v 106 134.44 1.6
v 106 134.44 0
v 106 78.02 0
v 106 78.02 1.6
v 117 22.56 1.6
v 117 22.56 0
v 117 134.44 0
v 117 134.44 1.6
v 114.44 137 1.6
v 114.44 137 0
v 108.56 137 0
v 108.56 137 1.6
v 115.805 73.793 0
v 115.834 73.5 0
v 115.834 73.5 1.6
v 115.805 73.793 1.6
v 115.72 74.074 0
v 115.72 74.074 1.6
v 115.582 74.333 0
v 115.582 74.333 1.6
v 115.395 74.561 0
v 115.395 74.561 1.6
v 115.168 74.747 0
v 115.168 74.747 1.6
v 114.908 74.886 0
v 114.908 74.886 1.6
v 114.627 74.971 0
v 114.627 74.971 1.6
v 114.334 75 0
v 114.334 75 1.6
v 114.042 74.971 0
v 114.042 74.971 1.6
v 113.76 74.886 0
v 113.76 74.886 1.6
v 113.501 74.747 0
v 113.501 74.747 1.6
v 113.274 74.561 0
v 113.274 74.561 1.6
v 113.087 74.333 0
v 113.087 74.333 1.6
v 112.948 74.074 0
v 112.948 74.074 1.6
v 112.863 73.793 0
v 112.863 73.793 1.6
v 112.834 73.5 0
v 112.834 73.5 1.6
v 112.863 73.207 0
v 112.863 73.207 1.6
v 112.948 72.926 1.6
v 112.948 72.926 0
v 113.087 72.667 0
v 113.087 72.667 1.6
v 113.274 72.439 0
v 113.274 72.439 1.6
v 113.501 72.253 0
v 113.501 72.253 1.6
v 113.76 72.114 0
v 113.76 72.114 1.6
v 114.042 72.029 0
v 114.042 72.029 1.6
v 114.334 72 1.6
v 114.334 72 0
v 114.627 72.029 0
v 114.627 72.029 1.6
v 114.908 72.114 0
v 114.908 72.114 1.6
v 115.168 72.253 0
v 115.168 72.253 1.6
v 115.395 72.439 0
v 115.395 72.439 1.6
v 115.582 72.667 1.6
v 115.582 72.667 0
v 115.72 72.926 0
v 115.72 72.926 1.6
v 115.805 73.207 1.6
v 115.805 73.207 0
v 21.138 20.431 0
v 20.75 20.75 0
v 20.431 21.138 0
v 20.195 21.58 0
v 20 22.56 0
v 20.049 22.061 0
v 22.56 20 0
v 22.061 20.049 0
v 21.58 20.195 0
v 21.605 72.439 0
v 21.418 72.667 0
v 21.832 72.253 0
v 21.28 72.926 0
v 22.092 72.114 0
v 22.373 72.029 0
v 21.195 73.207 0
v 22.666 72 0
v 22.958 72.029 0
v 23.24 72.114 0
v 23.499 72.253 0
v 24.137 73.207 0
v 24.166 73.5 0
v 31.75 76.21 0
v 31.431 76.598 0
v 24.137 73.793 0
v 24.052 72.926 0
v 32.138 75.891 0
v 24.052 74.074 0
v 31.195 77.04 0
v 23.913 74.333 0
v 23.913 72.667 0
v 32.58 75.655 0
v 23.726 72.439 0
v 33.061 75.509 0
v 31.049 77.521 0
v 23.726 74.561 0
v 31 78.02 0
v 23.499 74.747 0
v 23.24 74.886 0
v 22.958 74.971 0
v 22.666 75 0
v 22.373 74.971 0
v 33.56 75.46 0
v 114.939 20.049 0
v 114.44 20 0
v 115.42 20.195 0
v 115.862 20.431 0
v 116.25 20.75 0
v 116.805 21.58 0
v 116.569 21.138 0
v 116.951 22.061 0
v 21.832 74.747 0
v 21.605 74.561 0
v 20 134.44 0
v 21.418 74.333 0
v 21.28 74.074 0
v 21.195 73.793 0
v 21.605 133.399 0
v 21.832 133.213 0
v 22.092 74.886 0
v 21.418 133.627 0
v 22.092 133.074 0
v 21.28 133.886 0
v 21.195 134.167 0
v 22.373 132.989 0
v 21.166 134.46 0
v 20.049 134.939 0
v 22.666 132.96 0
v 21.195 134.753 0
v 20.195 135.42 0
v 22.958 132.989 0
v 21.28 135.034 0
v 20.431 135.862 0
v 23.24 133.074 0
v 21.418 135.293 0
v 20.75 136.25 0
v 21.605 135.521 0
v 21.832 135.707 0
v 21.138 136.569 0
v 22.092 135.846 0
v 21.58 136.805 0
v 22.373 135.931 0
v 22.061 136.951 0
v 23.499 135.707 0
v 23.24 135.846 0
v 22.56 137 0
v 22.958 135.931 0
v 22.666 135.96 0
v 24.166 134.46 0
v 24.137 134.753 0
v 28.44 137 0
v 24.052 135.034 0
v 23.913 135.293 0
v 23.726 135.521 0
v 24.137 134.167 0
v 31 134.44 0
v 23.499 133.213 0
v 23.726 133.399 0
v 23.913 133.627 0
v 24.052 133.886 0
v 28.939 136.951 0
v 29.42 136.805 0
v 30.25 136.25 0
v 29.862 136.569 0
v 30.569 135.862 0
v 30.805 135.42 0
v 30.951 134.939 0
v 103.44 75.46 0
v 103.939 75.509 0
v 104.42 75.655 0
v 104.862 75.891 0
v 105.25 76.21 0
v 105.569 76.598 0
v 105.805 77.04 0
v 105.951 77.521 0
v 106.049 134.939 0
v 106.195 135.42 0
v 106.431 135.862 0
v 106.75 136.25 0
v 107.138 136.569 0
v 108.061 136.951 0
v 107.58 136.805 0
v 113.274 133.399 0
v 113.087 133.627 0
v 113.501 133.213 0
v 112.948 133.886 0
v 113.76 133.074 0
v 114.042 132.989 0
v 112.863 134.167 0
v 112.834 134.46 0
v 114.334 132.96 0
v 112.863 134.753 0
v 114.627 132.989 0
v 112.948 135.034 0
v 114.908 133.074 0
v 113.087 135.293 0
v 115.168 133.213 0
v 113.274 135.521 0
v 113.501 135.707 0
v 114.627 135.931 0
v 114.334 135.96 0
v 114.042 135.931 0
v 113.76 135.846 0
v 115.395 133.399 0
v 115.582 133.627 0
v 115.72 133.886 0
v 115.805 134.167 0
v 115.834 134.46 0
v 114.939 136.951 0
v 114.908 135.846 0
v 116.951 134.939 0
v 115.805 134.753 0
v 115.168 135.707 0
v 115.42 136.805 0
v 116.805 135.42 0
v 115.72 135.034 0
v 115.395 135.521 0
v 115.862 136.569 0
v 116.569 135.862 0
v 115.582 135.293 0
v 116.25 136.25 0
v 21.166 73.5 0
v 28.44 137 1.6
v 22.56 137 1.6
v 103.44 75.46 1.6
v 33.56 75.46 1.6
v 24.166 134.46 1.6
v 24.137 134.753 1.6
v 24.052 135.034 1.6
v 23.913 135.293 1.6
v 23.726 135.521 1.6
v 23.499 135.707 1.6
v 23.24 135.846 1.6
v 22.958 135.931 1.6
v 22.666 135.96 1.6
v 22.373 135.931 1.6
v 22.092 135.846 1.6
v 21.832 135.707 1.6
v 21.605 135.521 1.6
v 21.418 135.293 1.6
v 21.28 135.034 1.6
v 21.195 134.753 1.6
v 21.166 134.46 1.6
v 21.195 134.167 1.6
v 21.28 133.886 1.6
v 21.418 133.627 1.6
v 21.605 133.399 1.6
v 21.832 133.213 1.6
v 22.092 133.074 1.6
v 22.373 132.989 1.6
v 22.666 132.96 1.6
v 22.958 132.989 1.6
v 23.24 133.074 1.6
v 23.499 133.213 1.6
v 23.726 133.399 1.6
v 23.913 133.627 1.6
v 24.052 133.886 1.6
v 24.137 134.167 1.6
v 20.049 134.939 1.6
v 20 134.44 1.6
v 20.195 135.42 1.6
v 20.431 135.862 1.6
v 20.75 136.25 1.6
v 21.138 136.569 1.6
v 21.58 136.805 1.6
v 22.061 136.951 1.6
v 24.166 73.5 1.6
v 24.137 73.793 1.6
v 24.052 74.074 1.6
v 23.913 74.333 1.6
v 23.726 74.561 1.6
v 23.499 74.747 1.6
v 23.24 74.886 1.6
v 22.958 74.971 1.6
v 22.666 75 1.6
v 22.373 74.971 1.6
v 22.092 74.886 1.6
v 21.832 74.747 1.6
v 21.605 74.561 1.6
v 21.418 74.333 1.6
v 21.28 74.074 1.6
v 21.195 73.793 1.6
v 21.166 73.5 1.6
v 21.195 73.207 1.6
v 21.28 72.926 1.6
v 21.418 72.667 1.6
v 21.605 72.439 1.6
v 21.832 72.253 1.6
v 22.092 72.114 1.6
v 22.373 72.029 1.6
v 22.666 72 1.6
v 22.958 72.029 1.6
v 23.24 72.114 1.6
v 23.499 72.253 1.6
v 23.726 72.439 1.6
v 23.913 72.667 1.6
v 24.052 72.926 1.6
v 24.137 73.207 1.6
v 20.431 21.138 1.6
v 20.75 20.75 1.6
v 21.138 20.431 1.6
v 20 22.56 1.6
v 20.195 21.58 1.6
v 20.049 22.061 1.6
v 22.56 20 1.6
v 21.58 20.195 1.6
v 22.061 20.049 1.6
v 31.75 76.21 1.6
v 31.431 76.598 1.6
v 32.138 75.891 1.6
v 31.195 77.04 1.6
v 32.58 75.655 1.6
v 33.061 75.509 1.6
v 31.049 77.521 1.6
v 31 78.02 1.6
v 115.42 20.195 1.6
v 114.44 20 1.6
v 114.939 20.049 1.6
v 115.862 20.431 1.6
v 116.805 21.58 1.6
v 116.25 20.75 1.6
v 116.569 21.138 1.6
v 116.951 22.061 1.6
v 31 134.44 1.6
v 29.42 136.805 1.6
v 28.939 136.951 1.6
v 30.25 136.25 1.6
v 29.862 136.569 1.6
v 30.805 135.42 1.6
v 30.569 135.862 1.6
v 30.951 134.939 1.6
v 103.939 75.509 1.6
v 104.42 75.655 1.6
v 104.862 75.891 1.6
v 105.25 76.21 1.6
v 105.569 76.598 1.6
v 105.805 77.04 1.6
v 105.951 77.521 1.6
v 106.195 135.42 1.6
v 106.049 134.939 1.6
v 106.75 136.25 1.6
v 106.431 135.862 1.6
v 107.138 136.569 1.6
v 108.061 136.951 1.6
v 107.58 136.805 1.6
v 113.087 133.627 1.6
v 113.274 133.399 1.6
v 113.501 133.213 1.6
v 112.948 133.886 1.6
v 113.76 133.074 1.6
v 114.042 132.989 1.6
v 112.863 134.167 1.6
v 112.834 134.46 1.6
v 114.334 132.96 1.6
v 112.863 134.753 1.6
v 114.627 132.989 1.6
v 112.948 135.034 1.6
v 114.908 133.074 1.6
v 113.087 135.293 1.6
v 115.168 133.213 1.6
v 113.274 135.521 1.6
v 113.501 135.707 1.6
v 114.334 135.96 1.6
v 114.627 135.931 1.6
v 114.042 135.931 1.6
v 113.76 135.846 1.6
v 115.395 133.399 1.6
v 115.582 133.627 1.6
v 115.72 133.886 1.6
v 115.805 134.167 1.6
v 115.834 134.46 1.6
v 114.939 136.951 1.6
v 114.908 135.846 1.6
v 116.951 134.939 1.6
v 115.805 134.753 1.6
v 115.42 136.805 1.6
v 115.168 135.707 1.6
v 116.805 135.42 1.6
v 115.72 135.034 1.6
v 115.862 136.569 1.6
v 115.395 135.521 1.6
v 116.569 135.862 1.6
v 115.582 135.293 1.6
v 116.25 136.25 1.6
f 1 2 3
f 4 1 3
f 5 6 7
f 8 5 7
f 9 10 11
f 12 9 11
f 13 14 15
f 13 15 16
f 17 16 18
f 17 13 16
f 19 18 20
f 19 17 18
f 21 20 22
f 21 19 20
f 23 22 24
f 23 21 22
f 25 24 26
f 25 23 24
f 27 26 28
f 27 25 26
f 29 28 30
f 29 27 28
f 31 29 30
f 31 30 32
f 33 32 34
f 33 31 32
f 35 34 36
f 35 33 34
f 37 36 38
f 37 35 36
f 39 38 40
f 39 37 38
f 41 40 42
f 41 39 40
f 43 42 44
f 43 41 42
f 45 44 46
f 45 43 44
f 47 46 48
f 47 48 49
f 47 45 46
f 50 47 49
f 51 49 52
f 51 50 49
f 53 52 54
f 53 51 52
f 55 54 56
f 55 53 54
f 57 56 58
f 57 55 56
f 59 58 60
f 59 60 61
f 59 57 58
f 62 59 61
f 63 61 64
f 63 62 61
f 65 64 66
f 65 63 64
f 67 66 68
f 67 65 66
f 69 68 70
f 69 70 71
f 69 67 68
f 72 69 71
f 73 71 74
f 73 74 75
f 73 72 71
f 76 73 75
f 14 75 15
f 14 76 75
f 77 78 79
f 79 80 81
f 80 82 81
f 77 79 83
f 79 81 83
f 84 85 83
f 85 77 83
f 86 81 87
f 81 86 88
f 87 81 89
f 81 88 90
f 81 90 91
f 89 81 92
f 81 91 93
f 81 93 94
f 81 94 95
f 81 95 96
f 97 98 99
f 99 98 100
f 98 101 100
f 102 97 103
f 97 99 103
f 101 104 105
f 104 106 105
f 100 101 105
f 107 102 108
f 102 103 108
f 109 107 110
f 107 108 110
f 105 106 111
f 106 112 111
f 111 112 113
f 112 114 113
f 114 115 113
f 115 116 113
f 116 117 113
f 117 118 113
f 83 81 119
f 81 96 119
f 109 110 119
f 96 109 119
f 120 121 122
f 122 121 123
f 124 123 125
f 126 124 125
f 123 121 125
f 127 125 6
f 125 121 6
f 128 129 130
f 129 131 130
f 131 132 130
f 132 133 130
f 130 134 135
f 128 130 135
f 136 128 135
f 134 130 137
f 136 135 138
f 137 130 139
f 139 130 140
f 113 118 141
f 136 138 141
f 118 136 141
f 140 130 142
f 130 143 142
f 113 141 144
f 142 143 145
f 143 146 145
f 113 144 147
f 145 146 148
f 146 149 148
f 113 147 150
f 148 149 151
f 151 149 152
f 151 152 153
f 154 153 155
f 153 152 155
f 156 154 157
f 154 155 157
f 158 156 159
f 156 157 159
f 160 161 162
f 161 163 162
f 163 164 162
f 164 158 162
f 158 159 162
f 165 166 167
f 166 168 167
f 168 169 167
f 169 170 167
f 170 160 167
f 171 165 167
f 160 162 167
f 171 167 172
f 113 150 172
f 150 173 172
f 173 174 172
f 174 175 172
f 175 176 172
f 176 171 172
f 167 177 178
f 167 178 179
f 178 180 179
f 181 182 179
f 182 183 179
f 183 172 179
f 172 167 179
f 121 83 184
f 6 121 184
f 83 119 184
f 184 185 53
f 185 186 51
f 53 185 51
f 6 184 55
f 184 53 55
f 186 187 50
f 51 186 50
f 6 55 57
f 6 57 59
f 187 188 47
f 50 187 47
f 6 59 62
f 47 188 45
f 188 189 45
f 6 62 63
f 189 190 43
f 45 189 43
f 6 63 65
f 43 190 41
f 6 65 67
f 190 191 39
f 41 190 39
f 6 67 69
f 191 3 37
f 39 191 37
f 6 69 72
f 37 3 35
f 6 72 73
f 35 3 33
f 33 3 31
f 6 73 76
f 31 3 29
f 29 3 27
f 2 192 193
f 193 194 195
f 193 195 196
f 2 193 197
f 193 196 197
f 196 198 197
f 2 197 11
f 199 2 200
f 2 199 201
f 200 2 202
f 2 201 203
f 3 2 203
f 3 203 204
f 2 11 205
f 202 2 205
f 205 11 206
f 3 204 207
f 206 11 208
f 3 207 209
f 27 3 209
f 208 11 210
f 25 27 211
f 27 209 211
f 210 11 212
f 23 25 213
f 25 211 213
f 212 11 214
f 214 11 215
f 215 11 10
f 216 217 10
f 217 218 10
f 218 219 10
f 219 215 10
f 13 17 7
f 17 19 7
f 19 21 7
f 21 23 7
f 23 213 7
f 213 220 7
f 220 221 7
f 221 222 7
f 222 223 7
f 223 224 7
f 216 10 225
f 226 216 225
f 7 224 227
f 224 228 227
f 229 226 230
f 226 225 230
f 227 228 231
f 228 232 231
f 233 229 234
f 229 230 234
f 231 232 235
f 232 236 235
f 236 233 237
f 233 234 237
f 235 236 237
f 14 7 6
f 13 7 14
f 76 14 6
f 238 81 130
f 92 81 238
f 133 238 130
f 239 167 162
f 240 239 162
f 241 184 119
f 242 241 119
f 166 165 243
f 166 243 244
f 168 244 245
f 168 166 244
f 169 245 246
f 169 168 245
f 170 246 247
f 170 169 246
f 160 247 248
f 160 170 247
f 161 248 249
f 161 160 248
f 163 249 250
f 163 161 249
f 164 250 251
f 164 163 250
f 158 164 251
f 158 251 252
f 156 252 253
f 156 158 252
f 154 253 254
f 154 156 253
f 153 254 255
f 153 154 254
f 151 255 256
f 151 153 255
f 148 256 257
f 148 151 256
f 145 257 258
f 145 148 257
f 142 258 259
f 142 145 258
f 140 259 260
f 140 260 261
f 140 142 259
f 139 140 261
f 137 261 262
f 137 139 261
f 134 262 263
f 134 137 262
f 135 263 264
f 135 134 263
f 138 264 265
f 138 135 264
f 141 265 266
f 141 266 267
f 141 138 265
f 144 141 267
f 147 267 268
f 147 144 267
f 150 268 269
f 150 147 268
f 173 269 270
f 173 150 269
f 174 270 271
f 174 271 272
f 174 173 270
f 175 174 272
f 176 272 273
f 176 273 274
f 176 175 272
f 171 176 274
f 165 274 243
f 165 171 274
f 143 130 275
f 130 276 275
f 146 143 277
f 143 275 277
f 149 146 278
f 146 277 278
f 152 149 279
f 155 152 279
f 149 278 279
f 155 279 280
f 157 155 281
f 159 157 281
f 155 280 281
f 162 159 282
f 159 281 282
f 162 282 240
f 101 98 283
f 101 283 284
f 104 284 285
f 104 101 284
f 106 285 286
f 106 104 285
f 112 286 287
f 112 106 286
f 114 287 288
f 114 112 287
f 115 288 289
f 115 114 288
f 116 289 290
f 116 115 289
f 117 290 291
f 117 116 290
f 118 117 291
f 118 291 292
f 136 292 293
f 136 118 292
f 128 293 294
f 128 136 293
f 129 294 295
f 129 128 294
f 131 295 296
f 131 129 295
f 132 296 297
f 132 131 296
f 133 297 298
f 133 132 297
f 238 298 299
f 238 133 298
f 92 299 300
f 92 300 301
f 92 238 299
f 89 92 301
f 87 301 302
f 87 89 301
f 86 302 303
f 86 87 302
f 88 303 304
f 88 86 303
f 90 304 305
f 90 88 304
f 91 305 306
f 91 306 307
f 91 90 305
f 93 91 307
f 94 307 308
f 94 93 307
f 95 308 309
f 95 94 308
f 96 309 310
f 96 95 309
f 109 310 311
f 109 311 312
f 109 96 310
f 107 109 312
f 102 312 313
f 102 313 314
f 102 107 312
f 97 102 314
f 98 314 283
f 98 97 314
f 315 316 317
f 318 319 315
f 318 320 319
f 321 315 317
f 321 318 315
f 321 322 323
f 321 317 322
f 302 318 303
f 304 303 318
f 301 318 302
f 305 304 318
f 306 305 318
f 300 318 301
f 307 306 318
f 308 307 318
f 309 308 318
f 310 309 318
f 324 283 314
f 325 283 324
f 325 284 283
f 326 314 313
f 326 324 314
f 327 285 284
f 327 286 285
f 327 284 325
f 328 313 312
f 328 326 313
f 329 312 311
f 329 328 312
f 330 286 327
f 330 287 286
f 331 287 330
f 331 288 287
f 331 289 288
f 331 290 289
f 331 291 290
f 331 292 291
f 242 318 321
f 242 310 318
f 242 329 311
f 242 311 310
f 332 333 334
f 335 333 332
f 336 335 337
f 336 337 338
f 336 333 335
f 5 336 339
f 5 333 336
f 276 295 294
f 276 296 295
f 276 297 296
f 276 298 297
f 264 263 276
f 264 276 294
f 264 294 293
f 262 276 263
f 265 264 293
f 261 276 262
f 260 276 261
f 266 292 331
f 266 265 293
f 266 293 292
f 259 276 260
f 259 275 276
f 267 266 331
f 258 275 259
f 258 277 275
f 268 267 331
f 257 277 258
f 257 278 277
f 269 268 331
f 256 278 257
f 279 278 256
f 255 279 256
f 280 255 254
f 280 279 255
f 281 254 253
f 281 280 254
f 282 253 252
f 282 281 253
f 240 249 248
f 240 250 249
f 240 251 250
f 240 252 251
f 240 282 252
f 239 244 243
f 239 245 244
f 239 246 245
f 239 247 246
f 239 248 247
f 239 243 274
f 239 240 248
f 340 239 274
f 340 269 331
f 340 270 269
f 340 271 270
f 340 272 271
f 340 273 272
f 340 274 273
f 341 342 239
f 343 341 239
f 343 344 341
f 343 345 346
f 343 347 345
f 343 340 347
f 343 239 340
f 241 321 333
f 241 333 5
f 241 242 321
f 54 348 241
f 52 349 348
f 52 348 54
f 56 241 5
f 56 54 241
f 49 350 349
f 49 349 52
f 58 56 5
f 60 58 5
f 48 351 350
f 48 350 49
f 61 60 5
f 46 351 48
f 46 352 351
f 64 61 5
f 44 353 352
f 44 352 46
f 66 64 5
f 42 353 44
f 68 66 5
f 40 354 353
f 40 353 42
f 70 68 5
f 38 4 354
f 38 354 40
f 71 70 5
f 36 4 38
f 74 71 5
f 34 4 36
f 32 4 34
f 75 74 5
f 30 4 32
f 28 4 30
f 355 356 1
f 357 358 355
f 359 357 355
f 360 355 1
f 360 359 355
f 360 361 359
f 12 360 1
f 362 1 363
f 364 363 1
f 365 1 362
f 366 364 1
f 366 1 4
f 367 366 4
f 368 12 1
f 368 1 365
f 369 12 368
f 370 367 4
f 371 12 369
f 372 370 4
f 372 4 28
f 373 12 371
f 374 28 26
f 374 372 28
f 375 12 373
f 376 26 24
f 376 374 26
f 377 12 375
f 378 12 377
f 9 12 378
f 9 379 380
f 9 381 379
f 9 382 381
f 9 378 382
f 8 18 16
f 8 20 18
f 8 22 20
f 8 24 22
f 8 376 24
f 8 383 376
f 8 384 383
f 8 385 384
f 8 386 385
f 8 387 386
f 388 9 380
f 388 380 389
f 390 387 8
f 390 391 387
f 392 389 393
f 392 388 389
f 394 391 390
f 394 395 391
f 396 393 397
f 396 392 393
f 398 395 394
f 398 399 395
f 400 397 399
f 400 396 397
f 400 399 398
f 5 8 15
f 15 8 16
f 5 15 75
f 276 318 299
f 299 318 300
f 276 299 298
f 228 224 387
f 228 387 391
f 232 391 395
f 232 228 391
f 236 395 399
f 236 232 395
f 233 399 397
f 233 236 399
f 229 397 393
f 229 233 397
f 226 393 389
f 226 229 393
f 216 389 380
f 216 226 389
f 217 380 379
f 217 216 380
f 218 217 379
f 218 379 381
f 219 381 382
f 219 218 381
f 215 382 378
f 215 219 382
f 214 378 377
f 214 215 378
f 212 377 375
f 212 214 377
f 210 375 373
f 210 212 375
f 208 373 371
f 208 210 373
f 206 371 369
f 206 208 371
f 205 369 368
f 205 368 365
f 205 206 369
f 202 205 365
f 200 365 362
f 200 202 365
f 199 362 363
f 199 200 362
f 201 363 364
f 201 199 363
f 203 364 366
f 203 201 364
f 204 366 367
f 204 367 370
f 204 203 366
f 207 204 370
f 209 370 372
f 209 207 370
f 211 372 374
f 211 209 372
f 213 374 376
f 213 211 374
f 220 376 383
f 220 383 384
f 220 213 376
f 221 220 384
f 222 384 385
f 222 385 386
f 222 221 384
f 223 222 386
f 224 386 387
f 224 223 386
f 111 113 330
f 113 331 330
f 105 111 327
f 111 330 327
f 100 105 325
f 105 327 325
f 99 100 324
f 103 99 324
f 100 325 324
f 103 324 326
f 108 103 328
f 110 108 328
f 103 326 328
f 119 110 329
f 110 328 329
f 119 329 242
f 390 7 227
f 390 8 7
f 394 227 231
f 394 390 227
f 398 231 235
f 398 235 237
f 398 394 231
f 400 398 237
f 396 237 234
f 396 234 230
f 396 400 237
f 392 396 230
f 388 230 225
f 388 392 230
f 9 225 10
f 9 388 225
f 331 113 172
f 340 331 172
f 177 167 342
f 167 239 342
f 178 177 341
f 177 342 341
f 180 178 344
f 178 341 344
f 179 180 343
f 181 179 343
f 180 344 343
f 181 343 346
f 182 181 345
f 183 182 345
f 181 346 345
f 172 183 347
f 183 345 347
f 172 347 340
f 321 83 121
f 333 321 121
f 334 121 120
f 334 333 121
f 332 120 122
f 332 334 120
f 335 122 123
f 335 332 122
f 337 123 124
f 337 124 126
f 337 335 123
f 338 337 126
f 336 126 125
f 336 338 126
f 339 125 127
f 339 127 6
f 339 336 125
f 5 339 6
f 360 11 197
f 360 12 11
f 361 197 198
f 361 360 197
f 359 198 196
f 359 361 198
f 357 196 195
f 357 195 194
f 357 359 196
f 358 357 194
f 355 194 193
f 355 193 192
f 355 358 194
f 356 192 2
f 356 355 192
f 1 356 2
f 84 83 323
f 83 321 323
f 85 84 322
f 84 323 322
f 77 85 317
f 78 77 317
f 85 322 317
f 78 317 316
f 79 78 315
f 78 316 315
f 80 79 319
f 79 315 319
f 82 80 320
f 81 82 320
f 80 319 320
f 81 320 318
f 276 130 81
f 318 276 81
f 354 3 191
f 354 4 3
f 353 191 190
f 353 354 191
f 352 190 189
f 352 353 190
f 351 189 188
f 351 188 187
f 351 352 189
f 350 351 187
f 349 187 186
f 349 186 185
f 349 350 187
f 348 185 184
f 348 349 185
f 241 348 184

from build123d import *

# Parameters (mm, degrees)
SKETCH1_R   = 1.5
BOARD_DEPTH = 1.6
FILLET1_R   = 2.56


with BuildPart() as part:
    # Sketch1 → Board (new body)
    with BuildSketch(Plane.XY):
        Polygon((20, 20), (117, 20), (117, 137), (106, 137), (106, 75.46), (31, 75.46), (31, 137), (20, 137), align=None)
        with Locations((22.6657, 134.46)):
            Circle(SKETCH1_R, mode=Mode.SUBTRACT)
        with Locations((114.3343, 134.46)):
            Circle(SKETCH1_R, mode=Mode.SUBTRACT)
        with Locations((22.6657, 73.5)):
            Circle(SKETCH1_R, mode=Mode.SUBTRACT)
        with Locations((114.3343, 73.5)):
            Circle(SKETCH1_R, mode=Mode.SUBTRACT)
    extrude(amount=BOARD_DEPTH)

    # Fillet1
    fillet1_edges = [part.edges().sort_by_distance(p)[0] for p in [
        (20, 137, 0.8),
        (31, 137, 0.8),
        (31, 75.46, 0.8),
        (106, 75.46, 0.8),
        (106, 137, 0.8),
        (117, 137, 0.8),
        (117, 20, 0.8),
        (20, 20, 0.8),
    ]]
    fillet(fillet1_edges, radius=FILLET1_R)


solid = part.part
